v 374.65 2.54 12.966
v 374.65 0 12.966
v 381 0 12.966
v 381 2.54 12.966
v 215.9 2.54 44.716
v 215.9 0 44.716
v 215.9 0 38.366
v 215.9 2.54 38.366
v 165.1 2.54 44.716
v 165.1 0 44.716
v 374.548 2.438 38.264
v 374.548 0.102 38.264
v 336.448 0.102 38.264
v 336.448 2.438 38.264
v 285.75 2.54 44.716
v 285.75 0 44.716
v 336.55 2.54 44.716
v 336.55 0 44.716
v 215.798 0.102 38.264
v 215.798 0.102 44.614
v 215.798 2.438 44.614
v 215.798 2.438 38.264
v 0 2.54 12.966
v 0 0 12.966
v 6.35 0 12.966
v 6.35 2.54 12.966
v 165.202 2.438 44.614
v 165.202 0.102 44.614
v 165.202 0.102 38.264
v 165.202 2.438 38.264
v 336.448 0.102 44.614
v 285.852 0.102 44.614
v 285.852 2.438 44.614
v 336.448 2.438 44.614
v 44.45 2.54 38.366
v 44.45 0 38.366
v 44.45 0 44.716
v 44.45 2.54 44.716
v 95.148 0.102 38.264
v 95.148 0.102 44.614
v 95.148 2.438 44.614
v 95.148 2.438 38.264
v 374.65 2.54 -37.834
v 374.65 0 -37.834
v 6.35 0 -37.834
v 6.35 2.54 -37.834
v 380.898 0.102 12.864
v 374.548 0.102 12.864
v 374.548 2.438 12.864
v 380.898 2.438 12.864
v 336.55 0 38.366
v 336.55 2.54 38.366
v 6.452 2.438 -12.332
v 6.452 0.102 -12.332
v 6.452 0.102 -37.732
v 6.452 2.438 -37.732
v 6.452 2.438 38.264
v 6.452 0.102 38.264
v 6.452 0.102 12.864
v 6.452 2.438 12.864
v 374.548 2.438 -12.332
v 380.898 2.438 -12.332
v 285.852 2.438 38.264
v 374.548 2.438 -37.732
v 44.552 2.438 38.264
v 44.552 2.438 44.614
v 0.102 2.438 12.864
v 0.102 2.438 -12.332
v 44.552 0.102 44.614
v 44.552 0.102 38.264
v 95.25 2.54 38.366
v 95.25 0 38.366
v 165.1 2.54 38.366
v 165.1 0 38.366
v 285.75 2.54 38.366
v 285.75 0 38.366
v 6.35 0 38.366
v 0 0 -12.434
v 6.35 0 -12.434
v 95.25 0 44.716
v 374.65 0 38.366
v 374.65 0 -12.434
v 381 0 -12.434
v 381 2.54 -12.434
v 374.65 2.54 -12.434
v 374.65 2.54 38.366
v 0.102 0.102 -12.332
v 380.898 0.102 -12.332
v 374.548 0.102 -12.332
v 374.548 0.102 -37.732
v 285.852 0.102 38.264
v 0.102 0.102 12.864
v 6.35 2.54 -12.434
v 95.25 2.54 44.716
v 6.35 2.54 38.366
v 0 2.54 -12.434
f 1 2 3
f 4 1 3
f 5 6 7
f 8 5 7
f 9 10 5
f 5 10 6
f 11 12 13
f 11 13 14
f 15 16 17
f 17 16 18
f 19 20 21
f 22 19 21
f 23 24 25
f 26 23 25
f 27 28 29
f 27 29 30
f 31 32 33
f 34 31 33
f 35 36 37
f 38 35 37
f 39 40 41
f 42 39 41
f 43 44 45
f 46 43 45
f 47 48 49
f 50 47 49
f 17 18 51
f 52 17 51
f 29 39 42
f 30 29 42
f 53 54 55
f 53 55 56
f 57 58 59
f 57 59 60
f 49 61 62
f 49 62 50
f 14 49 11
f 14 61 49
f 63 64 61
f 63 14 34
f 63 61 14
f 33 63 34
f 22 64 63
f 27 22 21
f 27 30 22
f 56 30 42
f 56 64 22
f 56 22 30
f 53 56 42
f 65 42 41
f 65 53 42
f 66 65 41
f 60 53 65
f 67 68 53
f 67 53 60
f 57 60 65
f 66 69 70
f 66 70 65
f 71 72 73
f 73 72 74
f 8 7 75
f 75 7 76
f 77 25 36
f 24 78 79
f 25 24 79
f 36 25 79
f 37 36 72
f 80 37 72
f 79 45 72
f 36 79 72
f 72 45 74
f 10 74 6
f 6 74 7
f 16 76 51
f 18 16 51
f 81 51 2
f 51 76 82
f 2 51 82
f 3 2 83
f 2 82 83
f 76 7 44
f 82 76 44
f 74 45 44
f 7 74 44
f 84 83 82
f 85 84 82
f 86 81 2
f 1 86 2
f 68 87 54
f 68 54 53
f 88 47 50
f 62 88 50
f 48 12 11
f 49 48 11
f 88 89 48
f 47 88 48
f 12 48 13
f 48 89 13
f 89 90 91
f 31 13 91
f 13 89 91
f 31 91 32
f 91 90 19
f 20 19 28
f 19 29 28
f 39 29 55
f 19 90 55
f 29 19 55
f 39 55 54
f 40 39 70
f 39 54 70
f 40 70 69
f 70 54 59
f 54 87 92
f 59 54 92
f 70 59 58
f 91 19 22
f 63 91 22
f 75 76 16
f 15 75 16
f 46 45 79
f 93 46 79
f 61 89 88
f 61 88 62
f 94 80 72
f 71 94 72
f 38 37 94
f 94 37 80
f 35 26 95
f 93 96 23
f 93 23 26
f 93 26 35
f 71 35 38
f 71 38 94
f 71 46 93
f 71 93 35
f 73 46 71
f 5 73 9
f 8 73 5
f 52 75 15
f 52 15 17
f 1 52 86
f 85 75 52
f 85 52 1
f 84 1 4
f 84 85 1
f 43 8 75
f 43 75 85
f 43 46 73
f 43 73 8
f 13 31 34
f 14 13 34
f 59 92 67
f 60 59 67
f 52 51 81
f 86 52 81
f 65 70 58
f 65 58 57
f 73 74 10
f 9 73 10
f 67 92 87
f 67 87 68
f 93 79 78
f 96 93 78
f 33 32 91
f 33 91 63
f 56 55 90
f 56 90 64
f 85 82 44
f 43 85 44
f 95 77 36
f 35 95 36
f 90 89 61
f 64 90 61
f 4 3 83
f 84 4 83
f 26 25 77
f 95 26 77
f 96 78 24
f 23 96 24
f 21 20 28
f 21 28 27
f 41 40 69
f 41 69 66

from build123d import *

# Parameters (mm, degrees)
BOSS_EXTRUDE1_DEPTH = 2.54
SHELL1_START        = 6.4516
SHELL1_OUTLINE_W    = 2.3368
SHELL1_OUTLINE_H    = 75.9968
SHELL1_DEPTH        = 368.0968
SHELL1_START_2      = 44.5516
SHELL1_2_OUTLINE_W  = 2.3368
SHELL1_2_OUTLINE_H  = 6.35
SHELL1_2_DEPTH      = 50.5968
SHELL1_START_3      = 165.2016
SHELL1_3_OUTLINE_W  = 2.3368
SHELL1_3_OUTLINE_H  = 6.35
SHELL1_3_DEPTH      = 50.5968
SHELL1_START_4      = 285.8516
SHELL1_4_OUTLINE_W  = 2.3368
SHELL1_4_OUTLINE_H  = 6.35
SHELL1_4_DEPTH      = 50.5968
SHELL1_START_5      = 0.1016
SHELL1_5_OUTLINE_W  = 2.3368
SHELL1_5_OUTLINE_H  = 25.1968
SHELL1_5_DEPTH      = 380.7968


# Read off the part's stored shape, not the designer's step: Shell1
with BuildPart() as part:
    # Sketch1 → Boss-Extrude1 (new body)
    with BuildSketch(Plane(origin=(0, 0, 0), x_dir=(1, 0, 0), z_dir=(0, 1, 0))):
        Polygon((0, 12.434013317), (0, -12.965986683), (6.35, -12.965986683), (6.35, -38.365986683), (44.45, -38.365986683), (44.45, -44.715986683), (95.25, -44.715986683), (95.25, -38.365986683), (165.1, -38.365986683), (165.1, -44.715986683), (215.9, -44.715986683), (215.9, -38.365986683), (285.75, -38.365986683), (285.75, -44.715986683), (336.55, -44.715986683), (336.55, -38.365986683), (374.65, -38.365986683), (374.65, -12.965986683), (381, -12.965986683), (381, 12.434013317), (374.65, 12.434013317), (374.65, 37.834013317), (6.35, 37.834013317), (6.35, 12.434013317), align=None)
    extrude(amount=BOSS_EXTRUDE1_DEPTH)

    # Shell1 outline → Shell1 (cut)
    with BuildSketch(Plane.YZ.offset(SHELL1_START)):
        with Locations((1.27, 0.265986683)):
            Rectangle(SHELL1_OUTLINE_W, SHELL1_OUTLINE_H)
    extrude(amount=SHELL1_DEPTH, mode=Mode.SUBTRACT)

    # Shell1 2 outline → Shell1 2 (cut)
    with BuildSketch(Plane.YZ.offset(SHELL1_START_2)):
        with Locations((1.27, 41.439386683)):
            Rectangle(SHELL1_2_OUTLINE_W, SHELL1_2_OUTLINE_H)
    extrude(amount=SHELL1_2_DEPTH, mode=Mode.SUBTRACT)

    # Shell1 3 outline → Shell1 3 (cut)
    with BuildSketch(Plane.YZ.offset(SHELL1_START_3)):
        with Locations((1.27, 41.439386683)):
            Rectangle(SHELL1_3_OUTLINE_W, SHELL1_3_OUTLINE_H)
    extrude(amount=SHELL1_3_DEPTH, mode=Mode.SUBTRACT)

    # Shell1 4 outline → Shell1 4 (cut)
    with BuildSketch(Plane.YZ.offset(SHELL1_START_4)):
        with Locations((1.27, 41.439386683)):
            Rectangle(SHELL1_4_OUTLINE_W, SHELL1_4_OUTLINE_H)
    extrude(amount=SHELL1_4_DEPTH, mode=Mode.SUBTRACT)

    # Shell1 5 outline → Shell1 5 (cut)
    with BuildSketch(Plane.YZ.offset(SHELL1_START_5)):
        with Locations((1.27, 0.265986683)):
            Rectangle(SHELL1_5_OUTLINE_W, SHELL1_5_OUTLINE_H)
    extrude(amount=SHELL1_5_DEPTH, mode=Mode.SUBTRACT)


solid = part.part
